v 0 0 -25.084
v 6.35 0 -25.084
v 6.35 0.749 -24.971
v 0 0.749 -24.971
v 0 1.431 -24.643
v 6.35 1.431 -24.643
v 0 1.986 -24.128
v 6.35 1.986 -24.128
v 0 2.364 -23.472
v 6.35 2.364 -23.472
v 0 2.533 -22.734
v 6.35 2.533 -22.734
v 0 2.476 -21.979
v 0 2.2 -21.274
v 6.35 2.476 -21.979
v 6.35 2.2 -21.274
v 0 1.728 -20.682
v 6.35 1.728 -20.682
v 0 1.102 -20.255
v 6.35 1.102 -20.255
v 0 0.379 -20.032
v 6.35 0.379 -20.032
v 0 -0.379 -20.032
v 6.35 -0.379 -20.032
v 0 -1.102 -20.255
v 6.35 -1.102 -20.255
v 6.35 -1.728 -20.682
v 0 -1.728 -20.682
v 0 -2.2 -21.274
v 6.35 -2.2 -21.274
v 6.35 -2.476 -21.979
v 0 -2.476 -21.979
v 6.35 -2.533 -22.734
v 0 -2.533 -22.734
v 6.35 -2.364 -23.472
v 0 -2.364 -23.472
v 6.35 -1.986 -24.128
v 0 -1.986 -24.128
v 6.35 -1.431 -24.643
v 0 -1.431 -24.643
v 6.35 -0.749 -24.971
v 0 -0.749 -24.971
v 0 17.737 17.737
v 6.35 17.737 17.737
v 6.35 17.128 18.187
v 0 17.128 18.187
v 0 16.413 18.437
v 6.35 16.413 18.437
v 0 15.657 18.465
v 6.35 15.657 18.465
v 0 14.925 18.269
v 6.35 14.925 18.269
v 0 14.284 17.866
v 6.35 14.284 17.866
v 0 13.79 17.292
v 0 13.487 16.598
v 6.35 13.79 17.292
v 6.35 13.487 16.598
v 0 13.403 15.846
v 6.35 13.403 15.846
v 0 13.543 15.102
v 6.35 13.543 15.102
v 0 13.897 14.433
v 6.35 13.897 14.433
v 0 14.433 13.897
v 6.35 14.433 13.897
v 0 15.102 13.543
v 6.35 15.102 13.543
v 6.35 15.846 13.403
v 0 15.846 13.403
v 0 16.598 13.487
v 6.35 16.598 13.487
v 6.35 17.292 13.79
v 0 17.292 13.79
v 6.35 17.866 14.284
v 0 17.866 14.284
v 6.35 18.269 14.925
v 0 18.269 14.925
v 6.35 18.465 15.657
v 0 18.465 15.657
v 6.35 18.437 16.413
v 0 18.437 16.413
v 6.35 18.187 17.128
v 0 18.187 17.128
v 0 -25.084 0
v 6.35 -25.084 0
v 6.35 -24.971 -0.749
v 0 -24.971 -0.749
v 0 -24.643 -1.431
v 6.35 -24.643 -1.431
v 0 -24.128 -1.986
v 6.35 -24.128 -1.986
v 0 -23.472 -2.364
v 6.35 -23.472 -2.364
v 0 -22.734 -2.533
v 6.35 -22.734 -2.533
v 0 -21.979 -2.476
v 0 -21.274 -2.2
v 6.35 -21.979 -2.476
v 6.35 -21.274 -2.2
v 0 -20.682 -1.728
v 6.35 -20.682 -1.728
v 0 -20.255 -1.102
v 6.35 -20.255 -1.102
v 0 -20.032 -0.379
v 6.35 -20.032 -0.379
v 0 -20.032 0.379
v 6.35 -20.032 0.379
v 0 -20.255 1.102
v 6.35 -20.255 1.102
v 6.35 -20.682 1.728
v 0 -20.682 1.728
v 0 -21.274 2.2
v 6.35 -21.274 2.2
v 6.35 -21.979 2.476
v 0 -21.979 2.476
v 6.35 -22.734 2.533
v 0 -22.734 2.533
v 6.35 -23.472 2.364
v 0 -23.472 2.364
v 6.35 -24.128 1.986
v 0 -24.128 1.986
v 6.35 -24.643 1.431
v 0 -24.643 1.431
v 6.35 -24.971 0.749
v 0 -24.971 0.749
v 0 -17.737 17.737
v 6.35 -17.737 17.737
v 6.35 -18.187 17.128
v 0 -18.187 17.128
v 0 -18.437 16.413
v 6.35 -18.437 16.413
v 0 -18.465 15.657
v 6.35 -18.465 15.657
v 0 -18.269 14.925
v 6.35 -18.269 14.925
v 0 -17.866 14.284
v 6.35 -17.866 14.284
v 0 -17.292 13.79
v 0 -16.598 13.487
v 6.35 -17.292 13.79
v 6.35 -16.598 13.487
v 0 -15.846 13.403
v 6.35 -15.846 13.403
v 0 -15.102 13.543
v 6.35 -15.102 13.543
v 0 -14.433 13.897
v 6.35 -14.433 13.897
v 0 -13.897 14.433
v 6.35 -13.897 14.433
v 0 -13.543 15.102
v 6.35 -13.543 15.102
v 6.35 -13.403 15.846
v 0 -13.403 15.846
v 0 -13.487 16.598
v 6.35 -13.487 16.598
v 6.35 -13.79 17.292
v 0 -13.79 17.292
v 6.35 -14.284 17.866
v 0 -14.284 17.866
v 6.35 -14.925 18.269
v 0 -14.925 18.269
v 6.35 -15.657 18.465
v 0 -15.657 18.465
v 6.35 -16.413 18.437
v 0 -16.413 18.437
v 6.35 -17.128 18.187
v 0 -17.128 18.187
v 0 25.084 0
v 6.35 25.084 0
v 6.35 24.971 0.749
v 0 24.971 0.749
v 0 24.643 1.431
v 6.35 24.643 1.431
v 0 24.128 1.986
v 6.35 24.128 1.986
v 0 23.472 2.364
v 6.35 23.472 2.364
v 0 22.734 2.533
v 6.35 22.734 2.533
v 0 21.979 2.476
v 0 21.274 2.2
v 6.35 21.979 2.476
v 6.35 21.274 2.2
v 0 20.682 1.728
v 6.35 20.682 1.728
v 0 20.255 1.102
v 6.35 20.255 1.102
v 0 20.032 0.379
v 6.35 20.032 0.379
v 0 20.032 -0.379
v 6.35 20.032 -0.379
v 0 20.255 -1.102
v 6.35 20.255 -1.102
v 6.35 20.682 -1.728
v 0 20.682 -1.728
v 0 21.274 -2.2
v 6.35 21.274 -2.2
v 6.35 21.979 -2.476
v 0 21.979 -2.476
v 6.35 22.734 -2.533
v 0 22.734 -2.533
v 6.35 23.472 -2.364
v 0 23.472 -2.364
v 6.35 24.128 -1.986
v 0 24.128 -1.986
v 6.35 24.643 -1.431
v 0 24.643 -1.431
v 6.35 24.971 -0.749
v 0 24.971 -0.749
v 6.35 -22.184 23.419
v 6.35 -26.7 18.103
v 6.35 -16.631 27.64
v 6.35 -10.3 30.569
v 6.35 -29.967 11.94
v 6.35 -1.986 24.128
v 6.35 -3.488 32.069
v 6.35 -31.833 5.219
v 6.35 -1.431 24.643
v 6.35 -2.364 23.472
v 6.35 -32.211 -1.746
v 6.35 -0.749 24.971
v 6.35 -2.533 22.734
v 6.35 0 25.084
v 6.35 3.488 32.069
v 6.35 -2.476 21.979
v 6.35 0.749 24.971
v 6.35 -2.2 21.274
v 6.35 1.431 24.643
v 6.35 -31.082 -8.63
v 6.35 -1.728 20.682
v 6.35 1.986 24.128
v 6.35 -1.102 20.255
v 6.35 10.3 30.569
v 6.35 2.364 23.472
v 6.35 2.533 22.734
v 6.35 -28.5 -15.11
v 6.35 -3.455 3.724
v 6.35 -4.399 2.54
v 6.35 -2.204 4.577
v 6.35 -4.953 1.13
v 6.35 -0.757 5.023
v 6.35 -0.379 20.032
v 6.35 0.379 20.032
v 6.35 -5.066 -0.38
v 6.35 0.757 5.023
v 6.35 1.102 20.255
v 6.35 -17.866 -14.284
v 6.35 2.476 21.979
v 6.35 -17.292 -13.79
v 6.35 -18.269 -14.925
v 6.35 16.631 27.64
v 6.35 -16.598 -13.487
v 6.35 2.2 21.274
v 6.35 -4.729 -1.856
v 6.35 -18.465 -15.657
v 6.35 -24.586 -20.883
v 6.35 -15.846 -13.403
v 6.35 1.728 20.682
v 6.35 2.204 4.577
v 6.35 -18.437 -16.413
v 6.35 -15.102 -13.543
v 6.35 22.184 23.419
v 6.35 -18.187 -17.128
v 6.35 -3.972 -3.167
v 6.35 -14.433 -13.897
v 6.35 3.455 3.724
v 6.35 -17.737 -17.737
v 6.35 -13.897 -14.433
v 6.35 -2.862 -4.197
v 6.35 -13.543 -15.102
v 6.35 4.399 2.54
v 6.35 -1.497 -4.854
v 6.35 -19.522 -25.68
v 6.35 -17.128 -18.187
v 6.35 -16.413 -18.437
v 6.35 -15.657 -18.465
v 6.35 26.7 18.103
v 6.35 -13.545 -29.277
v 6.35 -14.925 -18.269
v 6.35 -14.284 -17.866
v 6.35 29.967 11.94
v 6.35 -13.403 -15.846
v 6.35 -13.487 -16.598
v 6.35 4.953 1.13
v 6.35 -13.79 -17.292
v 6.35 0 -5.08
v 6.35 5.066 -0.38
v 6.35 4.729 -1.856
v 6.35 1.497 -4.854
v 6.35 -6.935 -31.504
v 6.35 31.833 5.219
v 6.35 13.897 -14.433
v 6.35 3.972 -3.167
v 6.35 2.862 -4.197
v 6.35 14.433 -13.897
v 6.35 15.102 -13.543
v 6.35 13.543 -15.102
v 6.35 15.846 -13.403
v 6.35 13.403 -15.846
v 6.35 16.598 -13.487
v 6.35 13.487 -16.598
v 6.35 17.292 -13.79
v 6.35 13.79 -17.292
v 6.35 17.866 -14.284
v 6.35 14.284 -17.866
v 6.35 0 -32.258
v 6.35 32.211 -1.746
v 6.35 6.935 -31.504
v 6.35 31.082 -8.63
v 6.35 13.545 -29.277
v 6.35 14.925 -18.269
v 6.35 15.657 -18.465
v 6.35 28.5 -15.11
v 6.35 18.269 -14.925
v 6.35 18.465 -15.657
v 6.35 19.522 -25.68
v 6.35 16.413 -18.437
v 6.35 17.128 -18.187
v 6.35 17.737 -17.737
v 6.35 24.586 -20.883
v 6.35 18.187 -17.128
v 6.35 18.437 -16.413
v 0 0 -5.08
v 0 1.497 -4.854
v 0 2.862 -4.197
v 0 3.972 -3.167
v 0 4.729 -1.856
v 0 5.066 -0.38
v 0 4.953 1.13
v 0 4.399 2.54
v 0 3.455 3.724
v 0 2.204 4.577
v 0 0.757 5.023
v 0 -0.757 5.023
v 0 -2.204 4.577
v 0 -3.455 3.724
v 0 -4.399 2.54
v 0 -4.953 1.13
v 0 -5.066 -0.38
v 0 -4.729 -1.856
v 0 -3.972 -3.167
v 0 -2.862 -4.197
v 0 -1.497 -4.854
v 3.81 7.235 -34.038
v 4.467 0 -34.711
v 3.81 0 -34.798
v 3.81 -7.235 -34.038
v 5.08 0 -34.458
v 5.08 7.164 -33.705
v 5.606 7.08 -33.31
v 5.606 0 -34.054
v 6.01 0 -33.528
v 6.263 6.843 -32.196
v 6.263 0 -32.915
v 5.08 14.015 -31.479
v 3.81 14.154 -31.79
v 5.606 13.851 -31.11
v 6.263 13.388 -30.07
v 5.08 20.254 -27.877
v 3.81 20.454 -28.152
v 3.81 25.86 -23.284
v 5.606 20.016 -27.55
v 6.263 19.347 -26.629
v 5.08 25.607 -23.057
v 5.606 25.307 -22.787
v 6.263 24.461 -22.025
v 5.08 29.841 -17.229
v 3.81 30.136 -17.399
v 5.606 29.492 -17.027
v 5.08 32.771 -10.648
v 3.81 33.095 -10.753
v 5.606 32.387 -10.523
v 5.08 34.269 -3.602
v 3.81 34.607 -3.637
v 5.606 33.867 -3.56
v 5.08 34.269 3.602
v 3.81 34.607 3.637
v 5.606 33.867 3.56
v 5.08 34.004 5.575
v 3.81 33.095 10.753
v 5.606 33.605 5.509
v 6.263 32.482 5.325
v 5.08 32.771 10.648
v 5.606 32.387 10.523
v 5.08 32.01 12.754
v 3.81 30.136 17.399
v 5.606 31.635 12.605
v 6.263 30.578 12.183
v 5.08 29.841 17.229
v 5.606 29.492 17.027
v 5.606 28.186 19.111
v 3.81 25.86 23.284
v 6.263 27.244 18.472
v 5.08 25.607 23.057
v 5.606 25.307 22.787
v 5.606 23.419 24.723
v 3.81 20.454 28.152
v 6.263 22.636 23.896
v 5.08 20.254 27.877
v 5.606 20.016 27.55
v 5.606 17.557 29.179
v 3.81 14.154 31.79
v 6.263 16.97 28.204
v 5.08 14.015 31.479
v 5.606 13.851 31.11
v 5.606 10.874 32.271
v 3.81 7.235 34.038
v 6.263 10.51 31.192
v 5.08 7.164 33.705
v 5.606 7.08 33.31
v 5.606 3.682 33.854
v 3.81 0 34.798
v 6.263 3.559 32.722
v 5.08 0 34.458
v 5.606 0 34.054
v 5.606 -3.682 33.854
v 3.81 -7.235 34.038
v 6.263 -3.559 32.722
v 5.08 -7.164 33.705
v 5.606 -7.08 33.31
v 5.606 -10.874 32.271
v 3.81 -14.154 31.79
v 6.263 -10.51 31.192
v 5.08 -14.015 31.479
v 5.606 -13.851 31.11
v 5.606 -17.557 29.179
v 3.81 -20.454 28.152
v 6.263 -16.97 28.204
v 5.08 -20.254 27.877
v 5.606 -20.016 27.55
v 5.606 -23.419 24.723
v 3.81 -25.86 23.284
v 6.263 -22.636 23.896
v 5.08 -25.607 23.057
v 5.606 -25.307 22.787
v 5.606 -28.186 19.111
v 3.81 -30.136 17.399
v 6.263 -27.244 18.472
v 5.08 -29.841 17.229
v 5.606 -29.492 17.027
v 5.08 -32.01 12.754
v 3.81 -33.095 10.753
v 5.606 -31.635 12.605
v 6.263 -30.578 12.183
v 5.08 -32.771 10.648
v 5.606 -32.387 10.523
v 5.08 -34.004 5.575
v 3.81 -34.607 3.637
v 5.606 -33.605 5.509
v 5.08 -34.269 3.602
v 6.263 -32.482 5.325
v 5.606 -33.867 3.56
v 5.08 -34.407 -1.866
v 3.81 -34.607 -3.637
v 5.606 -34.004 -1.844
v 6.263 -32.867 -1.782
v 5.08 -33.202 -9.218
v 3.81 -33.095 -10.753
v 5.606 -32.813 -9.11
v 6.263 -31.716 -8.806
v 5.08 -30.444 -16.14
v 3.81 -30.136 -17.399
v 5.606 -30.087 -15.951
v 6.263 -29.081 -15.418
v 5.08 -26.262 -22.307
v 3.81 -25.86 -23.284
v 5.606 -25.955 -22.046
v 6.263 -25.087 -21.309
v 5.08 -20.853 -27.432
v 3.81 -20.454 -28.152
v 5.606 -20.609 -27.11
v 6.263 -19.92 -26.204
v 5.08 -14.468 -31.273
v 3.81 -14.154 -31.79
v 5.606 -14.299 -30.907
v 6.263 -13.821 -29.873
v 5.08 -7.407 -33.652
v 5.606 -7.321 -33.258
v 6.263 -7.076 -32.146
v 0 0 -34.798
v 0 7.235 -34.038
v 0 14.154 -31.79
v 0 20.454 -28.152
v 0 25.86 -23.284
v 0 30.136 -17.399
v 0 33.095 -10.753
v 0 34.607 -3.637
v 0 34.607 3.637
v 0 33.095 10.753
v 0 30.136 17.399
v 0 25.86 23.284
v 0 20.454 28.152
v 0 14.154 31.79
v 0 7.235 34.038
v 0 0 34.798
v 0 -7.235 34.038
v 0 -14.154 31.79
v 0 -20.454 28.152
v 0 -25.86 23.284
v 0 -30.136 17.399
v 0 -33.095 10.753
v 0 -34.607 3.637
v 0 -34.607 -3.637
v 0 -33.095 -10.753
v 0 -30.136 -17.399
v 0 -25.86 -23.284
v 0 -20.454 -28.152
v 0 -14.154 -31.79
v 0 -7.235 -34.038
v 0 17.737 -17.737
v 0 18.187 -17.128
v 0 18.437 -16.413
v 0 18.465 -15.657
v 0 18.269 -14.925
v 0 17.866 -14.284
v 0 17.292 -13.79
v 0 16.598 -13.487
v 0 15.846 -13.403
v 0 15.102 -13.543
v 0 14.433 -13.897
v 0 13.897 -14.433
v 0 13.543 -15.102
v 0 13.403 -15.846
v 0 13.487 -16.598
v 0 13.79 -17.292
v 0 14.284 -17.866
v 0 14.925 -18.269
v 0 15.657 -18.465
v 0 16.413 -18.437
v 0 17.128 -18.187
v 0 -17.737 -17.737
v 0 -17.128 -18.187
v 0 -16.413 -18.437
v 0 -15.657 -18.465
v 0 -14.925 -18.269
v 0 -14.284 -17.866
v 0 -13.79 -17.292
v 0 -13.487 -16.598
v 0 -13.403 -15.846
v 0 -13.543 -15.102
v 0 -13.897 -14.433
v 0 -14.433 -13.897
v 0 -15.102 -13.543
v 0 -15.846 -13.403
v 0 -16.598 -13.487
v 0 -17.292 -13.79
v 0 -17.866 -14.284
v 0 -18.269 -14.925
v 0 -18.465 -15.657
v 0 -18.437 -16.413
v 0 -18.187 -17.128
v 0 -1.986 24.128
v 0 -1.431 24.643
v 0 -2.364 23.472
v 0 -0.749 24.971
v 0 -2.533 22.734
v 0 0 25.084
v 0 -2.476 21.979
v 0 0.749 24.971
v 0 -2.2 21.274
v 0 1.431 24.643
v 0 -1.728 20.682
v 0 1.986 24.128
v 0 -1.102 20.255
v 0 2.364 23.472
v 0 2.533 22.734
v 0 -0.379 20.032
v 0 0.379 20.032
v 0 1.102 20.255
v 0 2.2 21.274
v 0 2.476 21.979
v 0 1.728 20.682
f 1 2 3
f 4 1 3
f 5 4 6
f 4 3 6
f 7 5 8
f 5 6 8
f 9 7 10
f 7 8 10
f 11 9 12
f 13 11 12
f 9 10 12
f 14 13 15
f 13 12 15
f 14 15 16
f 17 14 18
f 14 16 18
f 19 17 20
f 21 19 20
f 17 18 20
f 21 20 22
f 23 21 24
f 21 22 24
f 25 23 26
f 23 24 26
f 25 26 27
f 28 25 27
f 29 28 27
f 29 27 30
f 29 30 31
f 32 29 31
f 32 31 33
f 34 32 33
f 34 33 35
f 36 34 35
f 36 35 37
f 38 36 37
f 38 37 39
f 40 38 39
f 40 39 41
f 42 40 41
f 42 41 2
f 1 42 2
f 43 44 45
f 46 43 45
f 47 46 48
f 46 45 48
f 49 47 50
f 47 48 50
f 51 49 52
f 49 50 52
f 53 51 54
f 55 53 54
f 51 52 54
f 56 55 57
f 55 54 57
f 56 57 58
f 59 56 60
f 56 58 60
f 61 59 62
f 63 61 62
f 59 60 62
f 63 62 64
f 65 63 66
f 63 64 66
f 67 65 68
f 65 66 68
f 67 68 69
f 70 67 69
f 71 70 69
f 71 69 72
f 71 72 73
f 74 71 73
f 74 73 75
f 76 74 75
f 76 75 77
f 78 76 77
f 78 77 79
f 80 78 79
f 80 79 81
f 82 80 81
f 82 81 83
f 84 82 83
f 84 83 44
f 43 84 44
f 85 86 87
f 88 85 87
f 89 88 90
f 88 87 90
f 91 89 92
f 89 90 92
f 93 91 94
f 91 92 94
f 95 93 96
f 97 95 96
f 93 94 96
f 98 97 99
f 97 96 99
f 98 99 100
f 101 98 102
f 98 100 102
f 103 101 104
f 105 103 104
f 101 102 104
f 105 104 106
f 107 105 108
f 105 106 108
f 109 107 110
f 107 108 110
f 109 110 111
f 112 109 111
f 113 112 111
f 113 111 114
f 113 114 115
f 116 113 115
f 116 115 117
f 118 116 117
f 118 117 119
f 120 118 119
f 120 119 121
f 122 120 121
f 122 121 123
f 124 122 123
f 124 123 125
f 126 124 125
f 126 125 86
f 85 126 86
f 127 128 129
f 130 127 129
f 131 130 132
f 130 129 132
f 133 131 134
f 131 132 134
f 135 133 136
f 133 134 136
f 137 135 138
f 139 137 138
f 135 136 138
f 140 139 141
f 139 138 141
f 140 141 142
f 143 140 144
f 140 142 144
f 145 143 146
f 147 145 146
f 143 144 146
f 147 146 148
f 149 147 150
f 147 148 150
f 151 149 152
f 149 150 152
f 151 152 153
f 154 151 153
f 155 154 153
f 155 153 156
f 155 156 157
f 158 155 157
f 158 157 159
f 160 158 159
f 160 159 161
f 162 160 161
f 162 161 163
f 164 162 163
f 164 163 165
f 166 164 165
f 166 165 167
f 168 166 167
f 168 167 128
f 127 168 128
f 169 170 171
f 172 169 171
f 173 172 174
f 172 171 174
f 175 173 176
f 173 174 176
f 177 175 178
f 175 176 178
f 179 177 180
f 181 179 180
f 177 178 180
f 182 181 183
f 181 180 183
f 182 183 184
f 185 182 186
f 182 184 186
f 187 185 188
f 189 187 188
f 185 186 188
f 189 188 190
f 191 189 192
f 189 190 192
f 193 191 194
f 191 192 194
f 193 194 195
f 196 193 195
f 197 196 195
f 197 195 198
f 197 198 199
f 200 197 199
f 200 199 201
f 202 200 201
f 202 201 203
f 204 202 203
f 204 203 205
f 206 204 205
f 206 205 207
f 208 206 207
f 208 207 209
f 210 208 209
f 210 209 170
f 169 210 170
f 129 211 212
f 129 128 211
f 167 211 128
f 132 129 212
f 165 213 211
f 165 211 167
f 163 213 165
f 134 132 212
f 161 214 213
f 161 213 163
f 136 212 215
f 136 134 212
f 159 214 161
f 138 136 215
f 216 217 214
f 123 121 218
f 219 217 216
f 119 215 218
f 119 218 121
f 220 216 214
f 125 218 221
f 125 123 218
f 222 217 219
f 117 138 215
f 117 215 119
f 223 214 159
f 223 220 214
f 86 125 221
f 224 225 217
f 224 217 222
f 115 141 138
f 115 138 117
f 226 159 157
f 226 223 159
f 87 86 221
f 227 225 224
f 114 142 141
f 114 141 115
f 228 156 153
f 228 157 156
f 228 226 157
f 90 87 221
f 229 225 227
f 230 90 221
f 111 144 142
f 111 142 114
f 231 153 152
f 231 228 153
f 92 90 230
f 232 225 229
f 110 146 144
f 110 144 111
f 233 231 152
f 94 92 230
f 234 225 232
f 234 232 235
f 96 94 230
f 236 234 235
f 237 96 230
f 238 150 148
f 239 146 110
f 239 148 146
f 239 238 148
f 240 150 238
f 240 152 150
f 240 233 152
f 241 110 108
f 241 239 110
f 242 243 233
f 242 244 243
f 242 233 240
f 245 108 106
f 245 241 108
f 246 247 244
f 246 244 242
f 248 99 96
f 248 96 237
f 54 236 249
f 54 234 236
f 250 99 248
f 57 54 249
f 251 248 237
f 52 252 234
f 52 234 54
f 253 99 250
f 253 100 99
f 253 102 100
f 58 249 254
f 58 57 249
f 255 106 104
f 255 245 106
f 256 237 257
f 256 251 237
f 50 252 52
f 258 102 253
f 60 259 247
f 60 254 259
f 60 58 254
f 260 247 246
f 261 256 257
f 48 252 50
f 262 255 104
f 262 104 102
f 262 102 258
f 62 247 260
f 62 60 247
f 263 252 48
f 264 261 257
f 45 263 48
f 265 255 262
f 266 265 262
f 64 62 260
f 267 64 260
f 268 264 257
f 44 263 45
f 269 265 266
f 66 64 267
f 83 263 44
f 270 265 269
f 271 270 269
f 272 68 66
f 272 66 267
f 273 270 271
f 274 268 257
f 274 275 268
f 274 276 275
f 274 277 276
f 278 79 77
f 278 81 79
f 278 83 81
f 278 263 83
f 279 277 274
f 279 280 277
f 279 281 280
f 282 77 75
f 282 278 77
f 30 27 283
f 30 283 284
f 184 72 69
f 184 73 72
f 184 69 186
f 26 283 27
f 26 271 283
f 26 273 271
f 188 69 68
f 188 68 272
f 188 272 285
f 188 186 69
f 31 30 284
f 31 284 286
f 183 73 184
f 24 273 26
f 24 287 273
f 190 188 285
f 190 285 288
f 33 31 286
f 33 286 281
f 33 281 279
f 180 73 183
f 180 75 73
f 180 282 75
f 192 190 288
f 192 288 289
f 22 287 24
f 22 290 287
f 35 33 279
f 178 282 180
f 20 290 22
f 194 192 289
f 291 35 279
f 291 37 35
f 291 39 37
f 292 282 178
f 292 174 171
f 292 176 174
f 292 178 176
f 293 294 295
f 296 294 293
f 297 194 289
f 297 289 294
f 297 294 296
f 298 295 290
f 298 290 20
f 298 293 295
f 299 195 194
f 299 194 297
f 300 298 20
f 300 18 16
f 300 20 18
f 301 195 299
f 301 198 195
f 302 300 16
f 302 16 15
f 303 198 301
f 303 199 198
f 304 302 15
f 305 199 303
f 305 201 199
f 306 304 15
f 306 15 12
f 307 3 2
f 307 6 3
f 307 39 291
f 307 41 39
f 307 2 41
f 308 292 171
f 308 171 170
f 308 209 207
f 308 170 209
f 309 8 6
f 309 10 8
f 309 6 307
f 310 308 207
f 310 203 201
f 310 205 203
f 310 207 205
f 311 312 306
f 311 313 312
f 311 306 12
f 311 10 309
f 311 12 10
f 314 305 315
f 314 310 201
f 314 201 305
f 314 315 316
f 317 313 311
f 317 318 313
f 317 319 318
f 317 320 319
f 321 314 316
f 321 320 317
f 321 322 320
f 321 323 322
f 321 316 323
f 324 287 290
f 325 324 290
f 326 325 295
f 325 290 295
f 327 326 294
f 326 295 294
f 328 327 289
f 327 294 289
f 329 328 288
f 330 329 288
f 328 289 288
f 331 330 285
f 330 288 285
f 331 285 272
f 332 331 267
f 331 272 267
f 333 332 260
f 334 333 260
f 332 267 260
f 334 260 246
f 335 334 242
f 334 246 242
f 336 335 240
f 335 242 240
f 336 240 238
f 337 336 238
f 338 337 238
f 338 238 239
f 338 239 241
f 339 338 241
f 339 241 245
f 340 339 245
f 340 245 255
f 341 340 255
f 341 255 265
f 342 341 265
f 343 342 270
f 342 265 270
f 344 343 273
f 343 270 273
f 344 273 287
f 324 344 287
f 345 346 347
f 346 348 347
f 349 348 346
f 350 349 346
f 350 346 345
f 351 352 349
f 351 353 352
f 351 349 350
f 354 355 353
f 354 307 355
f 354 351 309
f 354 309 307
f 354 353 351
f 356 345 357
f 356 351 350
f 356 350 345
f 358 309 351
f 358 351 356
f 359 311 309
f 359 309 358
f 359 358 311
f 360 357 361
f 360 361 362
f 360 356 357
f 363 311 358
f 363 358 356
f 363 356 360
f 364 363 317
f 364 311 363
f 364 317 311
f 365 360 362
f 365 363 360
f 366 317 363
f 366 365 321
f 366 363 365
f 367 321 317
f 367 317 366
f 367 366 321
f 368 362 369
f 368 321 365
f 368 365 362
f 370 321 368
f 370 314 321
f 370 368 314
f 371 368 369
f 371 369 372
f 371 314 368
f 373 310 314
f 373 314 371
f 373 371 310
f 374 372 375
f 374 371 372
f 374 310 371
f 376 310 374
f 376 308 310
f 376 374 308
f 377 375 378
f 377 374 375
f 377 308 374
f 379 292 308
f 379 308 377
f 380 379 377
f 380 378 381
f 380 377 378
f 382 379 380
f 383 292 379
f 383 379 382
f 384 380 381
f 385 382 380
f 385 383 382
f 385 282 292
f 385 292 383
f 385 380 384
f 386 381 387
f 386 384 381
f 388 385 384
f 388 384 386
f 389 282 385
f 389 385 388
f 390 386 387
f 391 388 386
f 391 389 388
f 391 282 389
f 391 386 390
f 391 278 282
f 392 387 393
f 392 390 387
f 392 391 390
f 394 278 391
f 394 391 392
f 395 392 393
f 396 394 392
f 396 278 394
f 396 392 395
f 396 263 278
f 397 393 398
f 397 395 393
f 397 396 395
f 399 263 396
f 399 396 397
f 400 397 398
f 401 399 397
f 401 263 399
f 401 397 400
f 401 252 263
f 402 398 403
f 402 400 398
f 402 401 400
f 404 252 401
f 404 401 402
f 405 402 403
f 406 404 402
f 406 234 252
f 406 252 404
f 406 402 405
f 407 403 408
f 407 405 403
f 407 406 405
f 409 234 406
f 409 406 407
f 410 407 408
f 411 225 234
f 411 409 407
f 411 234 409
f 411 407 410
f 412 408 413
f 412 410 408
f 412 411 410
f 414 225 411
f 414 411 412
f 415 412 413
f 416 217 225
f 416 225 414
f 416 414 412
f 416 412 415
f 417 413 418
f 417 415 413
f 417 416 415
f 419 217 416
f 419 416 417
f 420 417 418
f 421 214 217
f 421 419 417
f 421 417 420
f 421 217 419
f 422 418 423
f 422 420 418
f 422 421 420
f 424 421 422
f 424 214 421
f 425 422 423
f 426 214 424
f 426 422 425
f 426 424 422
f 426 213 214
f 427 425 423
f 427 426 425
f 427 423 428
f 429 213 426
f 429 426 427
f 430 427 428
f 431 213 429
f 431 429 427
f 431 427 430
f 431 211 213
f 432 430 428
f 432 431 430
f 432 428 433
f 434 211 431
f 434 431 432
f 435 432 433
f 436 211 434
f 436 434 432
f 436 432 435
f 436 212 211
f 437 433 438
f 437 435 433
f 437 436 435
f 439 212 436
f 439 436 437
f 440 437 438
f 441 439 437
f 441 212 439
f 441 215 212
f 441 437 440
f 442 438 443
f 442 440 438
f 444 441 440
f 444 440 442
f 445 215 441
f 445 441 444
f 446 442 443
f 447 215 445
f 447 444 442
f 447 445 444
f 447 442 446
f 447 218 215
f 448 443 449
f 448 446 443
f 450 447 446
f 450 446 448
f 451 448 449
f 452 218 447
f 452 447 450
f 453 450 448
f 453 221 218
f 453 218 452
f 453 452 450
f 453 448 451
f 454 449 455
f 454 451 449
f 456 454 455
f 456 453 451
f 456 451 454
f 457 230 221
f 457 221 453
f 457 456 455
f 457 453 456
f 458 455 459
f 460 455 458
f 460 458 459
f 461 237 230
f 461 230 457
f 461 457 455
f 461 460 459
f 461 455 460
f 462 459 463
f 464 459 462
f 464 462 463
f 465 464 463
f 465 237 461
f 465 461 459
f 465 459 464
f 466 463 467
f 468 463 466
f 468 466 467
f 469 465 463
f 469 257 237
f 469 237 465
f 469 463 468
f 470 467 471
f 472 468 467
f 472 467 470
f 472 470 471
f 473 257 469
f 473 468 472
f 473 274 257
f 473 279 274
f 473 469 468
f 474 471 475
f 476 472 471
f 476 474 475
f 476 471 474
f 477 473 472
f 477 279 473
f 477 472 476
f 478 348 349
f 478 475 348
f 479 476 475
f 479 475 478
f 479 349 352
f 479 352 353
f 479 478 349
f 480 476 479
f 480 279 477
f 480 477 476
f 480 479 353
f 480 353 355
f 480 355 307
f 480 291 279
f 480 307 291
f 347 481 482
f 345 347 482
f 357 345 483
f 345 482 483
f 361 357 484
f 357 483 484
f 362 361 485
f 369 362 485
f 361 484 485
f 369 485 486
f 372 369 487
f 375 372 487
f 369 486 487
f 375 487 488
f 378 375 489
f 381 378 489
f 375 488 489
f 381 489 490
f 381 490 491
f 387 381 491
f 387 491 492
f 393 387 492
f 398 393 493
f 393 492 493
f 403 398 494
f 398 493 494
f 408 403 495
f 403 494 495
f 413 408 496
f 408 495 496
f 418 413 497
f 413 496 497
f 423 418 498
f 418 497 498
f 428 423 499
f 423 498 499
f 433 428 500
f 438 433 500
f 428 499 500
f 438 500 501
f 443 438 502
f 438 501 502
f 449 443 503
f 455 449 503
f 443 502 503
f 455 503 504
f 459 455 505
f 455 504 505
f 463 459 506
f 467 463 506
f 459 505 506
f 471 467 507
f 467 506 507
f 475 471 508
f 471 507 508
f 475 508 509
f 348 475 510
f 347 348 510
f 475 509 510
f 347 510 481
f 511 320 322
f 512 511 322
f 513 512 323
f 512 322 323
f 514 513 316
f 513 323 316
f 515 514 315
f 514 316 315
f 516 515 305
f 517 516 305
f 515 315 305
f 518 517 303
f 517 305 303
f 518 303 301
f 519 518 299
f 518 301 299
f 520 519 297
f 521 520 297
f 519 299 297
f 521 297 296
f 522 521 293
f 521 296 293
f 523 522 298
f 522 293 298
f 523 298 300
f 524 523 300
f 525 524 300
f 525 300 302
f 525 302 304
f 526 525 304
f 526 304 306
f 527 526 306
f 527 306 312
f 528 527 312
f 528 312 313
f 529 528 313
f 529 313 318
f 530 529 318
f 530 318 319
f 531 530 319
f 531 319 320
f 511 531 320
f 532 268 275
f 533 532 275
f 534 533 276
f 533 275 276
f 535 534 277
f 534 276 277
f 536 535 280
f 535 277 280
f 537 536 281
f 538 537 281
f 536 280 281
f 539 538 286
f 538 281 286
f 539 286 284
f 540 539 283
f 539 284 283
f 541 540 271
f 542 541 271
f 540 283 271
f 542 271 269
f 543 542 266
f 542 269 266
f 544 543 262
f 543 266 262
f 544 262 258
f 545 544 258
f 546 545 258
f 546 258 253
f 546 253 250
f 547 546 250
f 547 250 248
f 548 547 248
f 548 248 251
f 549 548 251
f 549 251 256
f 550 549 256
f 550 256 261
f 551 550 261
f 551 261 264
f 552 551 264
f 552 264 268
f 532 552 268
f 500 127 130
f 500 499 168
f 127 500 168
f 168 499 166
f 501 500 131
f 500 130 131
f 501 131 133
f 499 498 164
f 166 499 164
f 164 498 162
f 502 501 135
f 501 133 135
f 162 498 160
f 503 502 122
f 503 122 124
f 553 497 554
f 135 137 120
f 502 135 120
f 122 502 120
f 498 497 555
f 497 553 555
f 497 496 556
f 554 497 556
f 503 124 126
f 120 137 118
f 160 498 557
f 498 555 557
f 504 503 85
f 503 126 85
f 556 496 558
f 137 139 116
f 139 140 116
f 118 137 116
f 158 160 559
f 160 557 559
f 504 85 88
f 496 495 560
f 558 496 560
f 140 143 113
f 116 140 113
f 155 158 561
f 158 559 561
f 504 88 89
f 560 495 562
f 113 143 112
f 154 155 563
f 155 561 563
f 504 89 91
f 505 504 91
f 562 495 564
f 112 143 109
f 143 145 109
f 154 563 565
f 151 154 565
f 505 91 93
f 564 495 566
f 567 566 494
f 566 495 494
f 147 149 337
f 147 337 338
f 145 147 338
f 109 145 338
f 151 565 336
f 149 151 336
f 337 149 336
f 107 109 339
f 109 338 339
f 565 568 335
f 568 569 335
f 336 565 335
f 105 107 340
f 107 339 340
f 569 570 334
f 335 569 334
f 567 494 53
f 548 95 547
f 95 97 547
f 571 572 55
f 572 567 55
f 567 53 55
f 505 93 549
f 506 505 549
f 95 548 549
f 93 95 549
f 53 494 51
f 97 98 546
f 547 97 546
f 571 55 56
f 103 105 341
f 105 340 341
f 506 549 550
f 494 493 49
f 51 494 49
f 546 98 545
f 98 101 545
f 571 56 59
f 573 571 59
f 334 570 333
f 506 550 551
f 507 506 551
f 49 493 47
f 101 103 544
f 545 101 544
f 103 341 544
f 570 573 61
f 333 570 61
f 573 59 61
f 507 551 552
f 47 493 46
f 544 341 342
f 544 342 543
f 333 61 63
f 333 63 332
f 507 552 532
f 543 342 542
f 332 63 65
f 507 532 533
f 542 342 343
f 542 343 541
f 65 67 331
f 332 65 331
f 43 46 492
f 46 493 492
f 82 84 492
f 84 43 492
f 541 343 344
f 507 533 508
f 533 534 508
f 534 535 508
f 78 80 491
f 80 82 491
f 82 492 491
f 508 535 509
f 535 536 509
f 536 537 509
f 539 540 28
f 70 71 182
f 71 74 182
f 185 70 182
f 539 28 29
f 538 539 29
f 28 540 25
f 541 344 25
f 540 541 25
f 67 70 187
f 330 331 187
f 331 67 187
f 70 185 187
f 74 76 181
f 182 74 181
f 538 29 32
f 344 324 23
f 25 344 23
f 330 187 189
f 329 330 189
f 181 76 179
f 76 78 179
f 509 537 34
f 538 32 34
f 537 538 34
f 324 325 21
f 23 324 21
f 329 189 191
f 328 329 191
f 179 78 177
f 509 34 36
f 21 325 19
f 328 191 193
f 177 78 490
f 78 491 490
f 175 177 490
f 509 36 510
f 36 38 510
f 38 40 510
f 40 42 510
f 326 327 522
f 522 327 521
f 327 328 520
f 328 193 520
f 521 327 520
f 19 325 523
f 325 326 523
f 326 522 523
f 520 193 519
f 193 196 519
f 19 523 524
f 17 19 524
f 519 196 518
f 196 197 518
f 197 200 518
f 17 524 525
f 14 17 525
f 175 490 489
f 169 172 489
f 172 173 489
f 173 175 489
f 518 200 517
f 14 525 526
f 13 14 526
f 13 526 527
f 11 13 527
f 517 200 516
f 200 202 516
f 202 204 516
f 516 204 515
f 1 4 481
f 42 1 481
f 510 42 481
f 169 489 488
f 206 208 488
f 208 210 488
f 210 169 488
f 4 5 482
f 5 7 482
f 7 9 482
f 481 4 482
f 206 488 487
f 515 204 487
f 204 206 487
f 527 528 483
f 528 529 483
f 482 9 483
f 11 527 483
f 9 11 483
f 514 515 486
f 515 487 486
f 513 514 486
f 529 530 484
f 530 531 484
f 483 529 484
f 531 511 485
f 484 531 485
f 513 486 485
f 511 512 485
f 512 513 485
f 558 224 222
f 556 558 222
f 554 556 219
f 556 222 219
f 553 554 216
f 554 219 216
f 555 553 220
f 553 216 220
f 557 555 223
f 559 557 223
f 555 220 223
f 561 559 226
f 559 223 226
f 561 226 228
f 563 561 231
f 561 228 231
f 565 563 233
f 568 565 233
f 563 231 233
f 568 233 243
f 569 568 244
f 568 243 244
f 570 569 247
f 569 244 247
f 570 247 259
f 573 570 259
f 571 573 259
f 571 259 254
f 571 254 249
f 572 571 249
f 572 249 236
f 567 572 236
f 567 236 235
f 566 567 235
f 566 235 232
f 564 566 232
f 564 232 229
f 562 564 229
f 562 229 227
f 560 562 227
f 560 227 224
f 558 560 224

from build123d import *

# Parameters (mm, degrees)
SKETCH1_R           = 34.798
BOSS_EXTRUDE1_DEPTH = 6.35
FILLET1_R           = 2.54
SKETCH2_R           = 5.08
CUT_EXTRUDE1_DEPTH  = 6.35
SKETCH3_R           = 2.54
CUT_EXTRUDE2_DEPTH  = 19.05
CIRPATTERN1_COUNT   = 8


with BuildPart() as part:
    # Sketch1 → Boss-Extrude1 (new body)
    with BuildSketch(Plane(origin=(0, 0, 0), x_dir=(0, 0, -1), z_dir=(1, 0, 0))):
        Circle(SKETCH1_R)
    extrude(amount=BOSS_EXTRUDE1_DEPTH)

    # Fillet1
    fillet1_edges = [part.edges().sort_by_distance(p)[0] for p in [
        (6.35, 0, 34.798),
    ]]
    fillet(fillet1_edges, radius=FILLET1_R)

    # Sketch2 → Cut-Extrude1 (cut)
    with BuildSketch(Plane(origin=(6.35, 0, 0), x_dir=(0, 0, -1), z_dir=(1, 0, 0))):
        Circle(SKETCH2_R)
    extrude(amount=-CUT_EXTRUDE1_DEPTH, mode=Mode.SUBTRACT)

    # Sketch3 → Cut-Extrude2 (cut)
    with BuildSketch(Plane(origin=(6.35, 0, 0), x_dir=(0, 0, -1), z_dir=(1, 0, 0))):
        with Locations((22.543897228, 0)):
            Circle(SKETCH3_R)
    cut_extrude2 = extrude(amount=-CUT_EXTRUDE2_DEPTH, mode=Mode.SUBTRACT)

    # CirPattern1: Cut-Extrude2 ×8 about axis
    cirpattern1_axis = Axis((0, 0, 0), (1, 0, 0))
    for i in range(1, CIRPATTERN1_COUNT):
        add(cut_extrude2.rotate(cirpattern1_axis, i * 360 / CIRPATTERN1_COUNT), mode=Mode.SUBTRACT)


solid = part.part
